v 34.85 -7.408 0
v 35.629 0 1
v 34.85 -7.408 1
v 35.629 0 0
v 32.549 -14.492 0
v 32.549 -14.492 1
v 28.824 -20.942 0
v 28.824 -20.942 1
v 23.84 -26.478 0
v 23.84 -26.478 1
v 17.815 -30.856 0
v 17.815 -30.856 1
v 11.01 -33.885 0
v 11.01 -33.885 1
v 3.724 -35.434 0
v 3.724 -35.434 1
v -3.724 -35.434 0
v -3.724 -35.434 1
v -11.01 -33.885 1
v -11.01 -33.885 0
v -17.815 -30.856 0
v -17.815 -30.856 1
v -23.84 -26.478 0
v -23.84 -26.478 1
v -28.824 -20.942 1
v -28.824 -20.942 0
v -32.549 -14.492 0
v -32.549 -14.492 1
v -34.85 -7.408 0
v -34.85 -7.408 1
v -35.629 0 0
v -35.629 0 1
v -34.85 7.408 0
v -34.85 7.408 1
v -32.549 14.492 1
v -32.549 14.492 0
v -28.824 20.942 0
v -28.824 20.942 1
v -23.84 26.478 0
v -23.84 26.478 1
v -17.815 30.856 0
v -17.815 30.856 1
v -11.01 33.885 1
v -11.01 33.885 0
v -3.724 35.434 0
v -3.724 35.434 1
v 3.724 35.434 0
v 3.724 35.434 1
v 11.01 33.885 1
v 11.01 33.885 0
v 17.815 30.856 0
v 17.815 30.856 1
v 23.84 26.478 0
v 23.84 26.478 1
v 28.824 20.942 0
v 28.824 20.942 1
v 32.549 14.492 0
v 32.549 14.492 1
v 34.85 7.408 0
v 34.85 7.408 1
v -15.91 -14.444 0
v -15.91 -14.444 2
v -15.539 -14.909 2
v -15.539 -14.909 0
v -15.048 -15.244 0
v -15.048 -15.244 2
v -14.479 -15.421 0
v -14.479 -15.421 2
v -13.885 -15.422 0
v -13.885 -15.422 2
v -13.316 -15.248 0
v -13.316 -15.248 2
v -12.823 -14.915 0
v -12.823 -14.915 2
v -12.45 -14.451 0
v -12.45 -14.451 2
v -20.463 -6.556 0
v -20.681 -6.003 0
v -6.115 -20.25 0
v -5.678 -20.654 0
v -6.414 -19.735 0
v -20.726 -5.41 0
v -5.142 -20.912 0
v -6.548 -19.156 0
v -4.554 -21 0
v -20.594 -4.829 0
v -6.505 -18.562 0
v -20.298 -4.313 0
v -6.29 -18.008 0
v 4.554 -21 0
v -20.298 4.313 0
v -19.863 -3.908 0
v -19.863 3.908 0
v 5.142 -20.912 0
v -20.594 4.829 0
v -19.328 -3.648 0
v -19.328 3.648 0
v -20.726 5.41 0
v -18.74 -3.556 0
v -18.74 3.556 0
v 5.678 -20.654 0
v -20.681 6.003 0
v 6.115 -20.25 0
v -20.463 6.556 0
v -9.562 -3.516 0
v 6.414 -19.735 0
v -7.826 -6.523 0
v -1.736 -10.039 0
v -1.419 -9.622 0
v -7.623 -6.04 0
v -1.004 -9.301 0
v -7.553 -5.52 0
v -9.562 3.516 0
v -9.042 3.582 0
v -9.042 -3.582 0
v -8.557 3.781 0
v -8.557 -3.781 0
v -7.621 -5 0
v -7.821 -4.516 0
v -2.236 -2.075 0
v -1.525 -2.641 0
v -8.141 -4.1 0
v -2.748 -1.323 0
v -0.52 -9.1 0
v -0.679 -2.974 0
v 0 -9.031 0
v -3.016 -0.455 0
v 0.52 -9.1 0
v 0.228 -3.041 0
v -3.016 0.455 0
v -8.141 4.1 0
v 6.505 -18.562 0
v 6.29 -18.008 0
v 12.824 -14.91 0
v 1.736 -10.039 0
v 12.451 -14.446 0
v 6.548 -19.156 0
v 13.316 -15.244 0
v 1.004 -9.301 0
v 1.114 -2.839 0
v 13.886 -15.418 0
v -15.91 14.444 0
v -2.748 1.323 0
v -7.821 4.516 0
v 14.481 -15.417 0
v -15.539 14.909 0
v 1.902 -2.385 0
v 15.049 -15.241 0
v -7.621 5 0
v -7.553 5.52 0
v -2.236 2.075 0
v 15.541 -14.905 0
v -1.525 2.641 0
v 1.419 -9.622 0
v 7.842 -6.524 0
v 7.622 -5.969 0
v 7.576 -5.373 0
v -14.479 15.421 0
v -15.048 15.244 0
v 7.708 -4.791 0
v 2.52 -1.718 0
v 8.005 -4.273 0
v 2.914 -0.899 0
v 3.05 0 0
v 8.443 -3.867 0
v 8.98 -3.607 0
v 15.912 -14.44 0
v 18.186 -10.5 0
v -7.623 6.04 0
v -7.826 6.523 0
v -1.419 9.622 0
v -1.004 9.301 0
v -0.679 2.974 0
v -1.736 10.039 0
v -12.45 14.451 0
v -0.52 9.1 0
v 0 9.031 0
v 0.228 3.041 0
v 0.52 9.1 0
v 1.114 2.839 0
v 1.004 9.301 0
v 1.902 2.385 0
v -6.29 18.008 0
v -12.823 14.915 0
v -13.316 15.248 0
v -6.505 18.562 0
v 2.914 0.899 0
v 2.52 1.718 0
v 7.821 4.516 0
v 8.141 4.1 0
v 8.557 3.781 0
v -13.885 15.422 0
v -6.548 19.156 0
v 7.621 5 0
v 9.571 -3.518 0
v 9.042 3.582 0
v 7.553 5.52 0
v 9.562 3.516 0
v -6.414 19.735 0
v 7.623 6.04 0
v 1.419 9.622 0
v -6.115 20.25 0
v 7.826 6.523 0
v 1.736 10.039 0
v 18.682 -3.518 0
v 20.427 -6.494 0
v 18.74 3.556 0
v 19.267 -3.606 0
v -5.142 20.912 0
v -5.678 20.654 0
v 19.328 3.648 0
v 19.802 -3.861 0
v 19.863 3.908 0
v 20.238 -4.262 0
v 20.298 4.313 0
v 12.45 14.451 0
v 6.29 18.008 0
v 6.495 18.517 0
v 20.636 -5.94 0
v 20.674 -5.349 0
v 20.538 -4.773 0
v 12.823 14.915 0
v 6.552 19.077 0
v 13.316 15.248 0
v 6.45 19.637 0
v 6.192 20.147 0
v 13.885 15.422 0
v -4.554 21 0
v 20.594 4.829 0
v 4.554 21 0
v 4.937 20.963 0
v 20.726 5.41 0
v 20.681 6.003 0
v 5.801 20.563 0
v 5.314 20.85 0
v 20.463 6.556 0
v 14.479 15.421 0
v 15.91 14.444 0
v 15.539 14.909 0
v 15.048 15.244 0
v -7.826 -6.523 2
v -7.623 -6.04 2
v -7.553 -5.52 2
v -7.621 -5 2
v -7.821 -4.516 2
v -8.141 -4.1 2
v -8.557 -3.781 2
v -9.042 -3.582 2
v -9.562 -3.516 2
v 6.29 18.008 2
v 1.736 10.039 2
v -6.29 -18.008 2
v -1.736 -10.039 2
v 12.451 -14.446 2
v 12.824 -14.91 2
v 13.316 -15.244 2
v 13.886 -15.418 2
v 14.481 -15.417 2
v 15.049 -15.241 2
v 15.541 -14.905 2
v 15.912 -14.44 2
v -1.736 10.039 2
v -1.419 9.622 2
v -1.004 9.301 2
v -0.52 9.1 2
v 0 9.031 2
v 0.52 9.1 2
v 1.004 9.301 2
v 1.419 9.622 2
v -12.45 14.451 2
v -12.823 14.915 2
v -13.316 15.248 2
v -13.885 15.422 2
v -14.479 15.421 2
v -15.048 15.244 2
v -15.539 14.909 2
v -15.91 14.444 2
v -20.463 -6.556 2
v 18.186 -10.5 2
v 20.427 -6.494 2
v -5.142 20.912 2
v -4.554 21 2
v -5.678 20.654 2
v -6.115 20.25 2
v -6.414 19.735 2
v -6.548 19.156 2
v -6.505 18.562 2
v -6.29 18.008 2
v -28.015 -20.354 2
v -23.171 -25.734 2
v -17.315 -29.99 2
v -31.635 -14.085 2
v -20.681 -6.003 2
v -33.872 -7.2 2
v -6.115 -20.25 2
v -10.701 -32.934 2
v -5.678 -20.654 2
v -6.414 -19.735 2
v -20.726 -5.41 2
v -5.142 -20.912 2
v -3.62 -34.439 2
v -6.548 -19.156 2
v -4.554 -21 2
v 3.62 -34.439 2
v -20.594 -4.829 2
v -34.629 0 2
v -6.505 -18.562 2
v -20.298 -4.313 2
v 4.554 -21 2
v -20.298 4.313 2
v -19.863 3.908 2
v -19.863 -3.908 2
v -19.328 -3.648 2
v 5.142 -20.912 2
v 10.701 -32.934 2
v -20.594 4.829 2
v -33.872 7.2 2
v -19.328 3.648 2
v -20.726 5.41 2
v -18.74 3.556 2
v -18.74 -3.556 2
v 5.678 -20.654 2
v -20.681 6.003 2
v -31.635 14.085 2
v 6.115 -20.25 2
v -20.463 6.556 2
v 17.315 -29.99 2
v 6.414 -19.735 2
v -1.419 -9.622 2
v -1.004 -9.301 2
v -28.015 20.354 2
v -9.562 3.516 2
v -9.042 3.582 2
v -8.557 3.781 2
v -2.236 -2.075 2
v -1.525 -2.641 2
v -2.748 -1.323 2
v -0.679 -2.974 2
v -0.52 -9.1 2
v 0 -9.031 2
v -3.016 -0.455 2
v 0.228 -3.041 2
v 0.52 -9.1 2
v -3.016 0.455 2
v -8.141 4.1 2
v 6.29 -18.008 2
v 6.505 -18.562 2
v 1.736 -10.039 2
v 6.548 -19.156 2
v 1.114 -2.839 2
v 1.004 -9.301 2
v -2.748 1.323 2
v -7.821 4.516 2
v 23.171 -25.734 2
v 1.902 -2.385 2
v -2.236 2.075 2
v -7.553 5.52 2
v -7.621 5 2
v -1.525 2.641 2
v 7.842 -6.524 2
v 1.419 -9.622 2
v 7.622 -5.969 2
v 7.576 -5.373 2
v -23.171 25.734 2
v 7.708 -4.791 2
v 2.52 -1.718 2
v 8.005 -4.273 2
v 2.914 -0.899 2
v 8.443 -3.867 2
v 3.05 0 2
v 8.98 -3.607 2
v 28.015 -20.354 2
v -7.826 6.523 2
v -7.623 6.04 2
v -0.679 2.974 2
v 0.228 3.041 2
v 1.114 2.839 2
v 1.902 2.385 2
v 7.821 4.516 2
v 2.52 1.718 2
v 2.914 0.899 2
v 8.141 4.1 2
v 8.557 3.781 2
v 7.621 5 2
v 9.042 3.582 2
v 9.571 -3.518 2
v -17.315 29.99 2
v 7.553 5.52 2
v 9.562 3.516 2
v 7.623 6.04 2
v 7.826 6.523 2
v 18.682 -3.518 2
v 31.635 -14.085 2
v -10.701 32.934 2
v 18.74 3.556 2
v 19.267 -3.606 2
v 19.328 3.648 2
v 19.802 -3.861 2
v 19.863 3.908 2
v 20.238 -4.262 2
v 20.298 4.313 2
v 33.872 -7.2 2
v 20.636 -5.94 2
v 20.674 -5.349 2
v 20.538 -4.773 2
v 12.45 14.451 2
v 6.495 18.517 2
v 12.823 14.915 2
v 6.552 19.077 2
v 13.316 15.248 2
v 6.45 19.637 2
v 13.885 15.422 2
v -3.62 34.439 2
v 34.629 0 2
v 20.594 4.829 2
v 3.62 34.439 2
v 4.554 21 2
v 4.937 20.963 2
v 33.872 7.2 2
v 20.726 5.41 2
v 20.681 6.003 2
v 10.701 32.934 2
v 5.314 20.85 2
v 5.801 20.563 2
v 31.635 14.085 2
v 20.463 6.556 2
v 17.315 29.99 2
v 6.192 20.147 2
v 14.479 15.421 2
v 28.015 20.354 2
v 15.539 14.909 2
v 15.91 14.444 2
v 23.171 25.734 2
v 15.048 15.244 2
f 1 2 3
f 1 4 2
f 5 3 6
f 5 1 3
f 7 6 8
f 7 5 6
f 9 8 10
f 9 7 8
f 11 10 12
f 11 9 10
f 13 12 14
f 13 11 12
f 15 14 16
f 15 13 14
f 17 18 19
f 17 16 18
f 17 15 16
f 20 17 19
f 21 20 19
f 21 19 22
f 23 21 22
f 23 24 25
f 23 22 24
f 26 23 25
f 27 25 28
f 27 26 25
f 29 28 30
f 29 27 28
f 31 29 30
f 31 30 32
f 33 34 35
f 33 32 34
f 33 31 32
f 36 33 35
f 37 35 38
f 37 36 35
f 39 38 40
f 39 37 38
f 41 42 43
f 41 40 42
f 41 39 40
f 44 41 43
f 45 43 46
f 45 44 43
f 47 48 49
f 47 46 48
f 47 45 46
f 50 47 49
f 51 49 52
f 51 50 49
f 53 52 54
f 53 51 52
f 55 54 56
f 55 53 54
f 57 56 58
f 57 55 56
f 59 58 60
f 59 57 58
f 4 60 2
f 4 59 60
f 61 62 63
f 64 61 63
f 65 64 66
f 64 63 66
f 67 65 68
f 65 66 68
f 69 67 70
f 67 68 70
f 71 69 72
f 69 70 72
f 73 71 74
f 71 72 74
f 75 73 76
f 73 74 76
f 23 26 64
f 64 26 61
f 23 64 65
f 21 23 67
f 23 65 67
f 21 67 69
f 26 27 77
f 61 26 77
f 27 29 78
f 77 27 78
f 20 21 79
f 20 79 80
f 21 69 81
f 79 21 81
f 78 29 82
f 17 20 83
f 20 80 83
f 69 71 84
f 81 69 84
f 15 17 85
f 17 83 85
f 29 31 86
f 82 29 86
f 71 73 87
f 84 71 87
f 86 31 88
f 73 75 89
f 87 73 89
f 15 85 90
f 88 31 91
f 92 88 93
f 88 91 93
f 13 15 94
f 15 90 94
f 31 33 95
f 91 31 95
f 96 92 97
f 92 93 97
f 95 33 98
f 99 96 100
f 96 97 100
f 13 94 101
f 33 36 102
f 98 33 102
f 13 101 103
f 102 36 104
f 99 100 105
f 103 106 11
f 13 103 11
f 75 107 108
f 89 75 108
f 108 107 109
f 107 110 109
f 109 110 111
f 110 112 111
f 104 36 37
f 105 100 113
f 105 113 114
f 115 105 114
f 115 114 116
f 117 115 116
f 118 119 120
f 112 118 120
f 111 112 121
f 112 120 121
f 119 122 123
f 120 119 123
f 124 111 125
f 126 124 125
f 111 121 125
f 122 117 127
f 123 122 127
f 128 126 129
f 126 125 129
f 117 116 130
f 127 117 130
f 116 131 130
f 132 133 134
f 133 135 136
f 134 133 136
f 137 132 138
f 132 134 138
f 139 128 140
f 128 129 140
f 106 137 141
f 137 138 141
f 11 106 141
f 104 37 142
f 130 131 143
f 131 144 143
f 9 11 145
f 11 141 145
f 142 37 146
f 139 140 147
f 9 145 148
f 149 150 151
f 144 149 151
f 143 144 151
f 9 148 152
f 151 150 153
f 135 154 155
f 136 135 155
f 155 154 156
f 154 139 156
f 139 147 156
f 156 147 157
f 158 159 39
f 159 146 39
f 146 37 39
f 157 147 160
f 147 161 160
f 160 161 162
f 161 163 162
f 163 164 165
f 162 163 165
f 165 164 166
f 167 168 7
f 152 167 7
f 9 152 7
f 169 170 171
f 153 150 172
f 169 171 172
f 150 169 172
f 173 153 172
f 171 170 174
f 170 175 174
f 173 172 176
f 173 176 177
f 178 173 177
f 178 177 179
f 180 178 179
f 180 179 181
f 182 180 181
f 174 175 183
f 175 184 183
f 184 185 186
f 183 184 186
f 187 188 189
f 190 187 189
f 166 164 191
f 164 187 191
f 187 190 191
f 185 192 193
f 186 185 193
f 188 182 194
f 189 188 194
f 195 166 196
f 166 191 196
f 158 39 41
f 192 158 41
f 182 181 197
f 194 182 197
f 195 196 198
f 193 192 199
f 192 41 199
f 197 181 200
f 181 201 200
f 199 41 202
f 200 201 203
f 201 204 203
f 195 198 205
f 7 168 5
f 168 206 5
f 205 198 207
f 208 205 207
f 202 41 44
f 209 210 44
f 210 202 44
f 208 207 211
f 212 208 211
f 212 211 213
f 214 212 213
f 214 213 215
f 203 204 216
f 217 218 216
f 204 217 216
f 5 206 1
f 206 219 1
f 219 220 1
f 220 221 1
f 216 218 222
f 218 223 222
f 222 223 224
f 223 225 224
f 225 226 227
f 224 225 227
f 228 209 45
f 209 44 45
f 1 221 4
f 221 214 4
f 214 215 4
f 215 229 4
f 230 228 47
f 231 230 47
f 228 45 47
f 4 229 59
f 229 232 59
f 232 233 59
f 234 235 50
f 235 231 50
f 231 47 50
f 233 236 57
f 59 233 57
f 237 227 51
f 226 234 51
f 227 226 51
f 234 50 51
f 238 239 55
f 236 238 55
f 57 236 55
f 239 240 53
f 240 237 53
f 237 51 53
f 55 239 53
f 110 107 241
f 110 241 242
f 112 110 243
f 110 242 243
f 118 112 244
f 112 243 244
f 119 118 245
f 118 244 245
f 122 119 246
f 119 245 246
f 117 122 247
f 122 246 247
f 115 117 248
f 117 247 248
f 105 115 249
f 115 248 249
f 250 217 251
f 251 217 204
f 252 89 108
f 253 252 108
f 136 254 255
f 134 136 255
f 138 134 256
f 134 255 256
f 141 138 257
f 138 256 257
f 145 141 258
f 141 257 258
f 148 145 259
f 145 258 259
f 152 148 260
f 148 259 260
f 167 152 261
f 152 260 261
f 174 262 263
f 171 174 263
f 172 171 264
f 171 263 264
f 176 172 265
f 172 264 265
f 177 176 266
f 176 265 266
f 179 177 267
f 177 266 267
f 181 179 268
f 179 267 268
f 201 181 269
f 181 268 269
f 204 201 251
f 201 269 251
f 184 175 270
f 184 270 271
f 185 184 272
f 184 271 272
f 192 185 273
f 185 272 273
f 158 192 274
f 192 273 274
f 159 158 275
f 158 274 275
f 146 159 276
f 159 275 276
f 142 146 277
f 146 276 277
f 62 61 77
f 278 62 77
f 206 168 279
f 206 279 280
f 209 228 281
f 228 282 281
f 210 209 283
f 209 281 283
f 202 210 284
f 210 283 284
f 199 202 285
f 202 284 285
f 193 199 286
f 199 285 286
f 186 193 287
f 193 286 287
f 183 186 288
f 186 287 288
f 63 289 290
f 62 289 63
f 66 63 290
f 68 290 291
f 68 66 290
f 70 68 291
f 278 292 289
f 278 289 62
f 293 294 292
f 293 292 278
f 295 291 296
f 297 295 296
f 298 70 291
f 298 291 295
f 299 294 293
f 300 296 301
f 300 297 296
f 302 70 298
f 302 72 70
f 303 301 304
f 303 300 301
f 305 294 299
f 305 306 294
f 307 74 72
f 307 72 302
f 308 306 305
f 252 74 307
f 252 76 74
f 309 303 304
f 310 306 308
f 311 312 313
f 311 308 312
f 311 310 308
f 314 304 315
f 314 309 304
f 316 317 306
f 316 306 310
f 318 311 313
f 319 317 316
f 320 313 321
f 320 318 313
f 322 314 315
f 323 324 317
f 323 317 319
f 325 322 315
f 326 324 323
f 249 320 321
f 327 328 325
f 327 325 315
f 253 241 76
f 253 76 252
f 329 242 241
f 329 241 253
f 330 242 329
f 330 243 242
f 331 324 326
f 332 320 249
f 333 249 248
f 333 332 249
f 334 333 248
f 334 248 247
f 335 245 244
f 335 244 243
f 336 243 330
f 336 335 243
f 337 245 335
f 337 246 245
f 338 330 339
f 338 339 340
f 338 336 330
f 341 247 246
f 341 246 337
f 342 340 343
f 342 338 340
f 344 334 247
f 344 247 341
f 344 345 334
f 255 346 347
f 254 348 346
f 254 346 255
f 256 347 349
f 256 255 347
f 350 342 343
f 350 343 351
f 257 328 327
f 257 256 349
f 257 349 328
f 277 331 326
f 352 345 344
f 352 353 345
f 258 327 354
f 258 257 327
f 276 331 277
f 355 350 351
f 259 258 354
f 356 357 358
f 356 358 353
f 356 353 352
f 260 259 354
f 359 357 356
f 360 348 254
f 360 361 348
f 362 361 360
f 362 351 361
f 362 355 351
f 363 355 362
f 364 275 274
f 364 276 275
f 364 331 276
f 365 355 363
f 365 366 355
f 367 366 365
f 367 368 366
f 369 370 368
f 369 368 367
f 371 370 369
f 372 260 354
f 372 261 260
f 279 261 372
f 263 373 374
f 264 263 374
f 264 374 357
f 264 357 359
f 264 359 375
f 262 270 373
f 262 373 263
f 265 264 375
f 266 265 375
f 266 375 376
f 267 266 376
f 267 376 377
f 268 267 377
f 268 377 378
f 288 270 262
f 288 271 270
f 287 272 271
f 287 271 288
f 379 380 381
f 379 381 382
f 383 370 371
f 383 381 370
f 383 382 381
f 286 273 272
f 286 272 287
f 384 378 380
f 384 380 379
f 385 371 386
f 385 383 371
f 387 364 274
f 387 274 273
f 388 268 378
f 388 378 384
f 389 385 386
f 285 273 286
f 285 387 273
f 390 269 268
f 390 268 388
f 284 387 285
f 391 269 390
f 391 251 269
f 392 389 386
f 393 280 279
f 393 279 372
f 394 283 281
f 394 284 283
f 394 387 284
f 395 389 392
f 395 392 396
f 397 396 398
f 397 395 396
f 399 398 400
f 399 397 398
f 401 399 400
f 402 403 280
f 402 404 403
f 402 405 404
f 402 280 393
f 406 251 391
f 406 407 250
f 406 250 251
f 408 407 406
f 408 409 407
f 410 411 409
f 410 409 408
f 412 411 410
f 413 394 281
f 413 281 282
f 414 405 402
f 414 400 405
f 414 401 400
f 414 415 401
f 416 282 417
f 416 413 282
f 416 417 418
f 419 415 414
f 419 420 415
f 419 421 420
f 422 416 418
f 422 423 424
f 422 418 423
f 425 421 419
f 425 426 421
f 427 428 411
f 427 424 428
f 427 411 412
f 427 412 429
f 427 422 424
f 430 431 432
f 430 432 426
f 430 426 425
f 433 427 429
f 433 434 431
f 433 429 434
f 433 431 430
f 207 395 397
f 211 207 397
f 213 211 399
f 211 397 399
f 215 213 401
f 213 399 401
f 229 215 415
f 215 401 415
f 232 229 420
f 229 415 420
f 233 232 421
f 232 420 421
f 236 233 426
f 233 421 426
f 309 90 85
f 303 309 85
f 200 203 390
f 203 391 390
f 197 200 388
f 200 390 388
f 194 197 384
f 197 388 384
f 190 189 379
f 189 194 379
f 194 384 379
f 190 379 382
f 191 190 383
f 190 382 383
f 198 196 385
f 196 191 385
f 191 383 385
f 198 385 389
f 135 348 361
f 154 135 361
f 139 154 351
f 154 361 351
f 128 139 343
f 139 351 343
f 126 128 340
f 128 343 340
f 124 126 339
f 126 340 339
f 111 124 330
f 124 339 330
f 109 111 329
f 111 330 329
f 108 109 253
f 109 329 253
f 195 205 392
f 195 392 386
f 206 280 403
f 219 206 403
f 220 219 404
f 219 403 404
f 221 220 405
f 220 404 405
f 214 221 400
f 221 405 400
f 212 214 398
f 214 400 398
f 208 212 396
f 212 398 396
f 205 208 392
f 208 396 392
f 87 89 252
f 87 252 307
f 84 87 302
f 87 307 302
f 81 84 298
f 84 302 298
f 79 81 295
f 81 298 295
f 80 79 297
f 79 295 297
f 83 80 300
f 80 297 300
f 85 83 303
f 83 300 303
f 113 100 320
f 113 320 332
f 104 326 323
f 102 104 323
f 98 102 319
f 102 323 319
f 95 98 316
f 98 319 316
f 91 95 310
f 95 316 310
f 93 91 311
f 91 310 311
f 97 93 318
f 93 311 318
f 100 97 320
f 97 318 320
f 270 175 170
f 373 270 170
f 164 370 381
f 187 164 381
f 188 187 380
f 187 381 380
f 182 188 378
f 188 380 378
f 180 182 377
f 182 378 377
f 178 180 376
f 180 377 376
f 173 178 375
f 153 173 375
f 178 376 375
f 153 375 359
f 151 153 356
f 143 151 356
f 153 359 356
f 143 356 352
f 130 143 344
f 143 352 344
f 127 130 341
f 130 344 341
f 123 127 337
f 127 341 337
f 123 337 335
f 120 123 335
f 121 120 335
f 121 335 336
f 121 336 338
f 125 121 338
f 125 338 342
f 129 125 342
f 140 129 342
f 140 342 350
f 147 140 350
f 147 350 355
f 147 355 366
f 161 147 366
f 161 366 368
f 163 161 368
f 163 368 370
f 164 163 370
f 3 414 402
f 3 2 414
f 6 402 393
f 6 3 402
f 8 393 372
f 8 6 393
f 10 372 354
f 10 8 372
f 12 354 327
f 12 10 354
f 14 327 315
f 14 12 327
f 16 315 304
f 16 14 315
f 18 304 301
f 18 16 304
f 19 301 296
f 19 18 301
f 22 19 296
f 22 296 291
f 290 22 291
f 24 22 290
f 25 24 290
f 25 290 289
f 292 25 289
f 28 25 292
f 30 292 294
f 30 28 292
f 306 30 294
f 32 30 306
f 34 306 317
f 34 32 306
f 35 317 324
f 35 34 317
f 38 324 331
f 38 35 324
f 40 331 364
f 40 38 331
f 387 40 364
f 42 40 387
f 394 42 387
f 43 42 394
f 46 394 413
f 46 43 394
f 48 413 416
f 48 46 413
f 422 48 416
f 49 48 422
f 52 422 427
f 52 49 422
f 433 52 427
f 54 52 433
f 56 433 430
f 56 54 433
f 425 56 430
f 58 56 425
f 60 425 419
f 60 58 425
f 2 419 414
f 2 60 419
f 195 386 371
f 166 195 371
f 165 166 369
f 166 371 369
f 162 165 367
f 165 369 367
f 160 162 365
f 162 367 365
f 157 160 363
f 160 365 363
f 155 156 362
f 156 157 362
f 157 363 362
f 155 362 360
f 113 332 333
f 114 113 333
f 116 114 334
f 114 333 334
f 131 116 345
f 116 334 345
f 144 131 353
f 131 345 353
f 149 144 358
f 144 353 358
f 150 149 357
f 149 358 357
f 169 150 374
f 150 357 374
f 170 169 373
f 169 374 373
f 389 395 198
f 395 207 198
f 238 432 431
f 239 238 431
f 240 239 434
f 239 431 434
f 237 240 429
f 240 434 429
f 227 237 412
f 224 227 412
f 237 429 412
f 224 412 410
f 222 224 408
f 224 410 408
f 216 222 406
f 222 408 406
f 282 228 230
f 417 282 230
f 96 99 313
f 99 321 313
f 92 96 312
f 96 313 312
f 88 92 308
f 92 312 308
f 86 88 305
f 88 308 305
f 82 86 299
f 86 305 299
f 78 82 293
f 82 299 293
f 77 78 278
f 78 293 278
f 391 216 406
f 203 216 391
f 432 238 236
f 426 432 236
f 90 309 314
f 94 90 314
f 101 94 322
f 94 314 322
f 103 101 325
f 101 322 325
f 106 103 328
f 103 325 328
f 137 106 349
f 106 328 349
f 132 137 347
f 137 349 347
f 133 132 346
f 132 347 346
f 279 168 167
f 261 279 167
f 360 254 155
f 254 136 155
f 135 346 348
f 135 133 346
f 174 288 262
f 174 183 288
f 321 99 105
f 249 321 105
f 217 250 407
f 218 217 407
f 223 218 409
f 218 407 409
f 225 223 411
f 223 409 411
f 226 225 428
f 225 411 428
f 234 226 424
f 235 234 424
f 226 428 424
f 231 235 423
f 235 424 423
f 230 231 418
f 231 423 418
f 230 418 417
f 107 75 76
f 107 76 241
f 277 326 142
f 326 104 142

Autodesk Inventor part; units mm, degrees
sketch "Sketch1" plane through (0, 0, 0) normal (0, 0, 1) x (1, 0, 0)
  line L0 (0, 2.8582) -> (0, -2.8582) construction
  line L1 (-5.7775, 0) -> (5.7775, 0) construction
  circle A0 centre (0, 0) radius 35.629
  circle A1 centre (0, 0) radius 4
  line L2 (0, 4) -> (0, 7)
  line L3 (0, 7) -> (0, 21)
  line L4 (0, 21) -> (5, 21)
  line L5 (5, 21) -> (8, 21)
  line L6 (8, 21) -> (0, 7)
  line L7 (0, 21) -> (-8, 21)
  line L8 (-8, 21) -> (0, 7)
  line L9 (0, -4) -> (0, -7)
  line L10 (0, -7) -> (0, -21)
  line L11 (0, -21) -> (8, -21)
  line L12 (8, -21) -> (0, -7)
  line L13 (0, -21) -> (-8, -21)
  line L14 (-8, -21) -> (0, -7)
  line L15 (0, 0) -> (2.5981, 1.5)
  line L16 (0, 0) -> (3, 0) construction
  line L17 (2.5981, 1.5) -> (3.4641, 2)
  line L18 (3.4641, 2) -> (6.0622, 3.5)
  line L19 (6.0622, 3.5) -> (18.1865, 10.5)
  line L20 (18.1865, 10.5) -> (14.1865, 17.4282)
  line L21 (14.1865, 17.4282) -> (6.0622, 3.5)
  line L22 (18.1865, 10.5) -> (22.1865, 3.5718)
  line L23 (22.1865, 3.5718) -> (6.0622, 3.5)
  line L24 (0, 0) -> (8, 0) construction
  line L25 (0, 0) -> (3.4641, -2)
  line L26 (0, 0) -> (4, 0) construction
  line L27 (3.4641, -2) -> (6.0622, -3.5)
  line L28 (6.0622, -3.5) -> (18.1865, -10.5)
  line L29 (18.1865, -10.5) -> (14.1865, -17.4282)
  line L30 (14.1865, -17.4282) -> (6.0934, -3.518)
  line L31 (18.1865, -10.5) -> (22.0919, -3.518)
  line L32 (22.0919, -3.518) -> (6.0934, -3.518)
  line L33 (0, 0) -> (-2.5981, 1.5)
  line L34 (0, 0) -> (3, 0) construction
  line L35 (-2.5981, 1.5) -> (-3.4641, 2)
  line L36 (-3.4641, 2) -> (-6.0622, 3.5)
  line L37 (-6.0622, 3.5) -> (-18.1865, 10.5)
  line L38 (-18.1865, 10.5) -> (-14.1865, 17.4282)
  line L39 (-14.1865, 17.4282) -> (-6.0622, 3.5)
  line L40 (-18.1865, 10.5) -> (-22.1865, 3.5718)
  line L41 (-22.1865, 3.5718) -> (-6.0622, 3.5)
  line L42 (0, 0) -> (-6.0622, -3.5)
  line L43 (0, 0) -> (7, 0) construction
  line L44 (-6.0622, -3.5) -> (-18.1865, -10.5)
  line L45 (-18.1865, -10.5) -> (-14.1865, -17.4282)
  line L46 (-14.1865, -17.4282) -> (-6.0622, -3.5)
  line L47 (-18.1865, -10.5) -> (-22.1865, -3.5718)
  line L48 (-22.1865, -3.5718) -> (-6.0622, -3.5)
  dimension "d0" = 71.258
  dimension "d1" = 8
  dimension "d2" = 3
  dimension "d3" = 14
  dimension "d4" = 5
  dimension "d5" = 3
  dimension "d6" = 8
  dimension "d7" = 3
  dimension "d8" = 14
  dimension "d9" = 8
  dimension "d10" = 8
  dimension "d11" = 3
  dimension "d12" = 30
  dimension "d13" = 3
  dimension "d14" = 14
  dimension "d15" = 8
  dimension "d16" = 8
  dimension "d19" = 4
  dimension "d20" = 30
  dimension "d21" = 3
  dimension "d22" = 14
  dimension "d23" = 8
  dimension "d24" = 8
  dimension "d25" = 3
  dimension "d26" = 150
  dimension "d27" = 1
  dimension "d28" = 180
  dimension "d29" = 3
  dimension "d30" = 180
  dimension "d31" = 180
  dimension "d32" = 8
  dimension "d33" = 8
  dimension "d34" = 7
  dimension "d35" = 150
  dimension "d36" = 14
  dimension "d37" = 180
  dimension "d38" = 8
  dimension "d39" = 8
extrude "Extrusion1" add sketch "Sketch1" along normal blind 2
fillet "Fillet1" radius 2 18 edges at (14.1865, 17.4282, 1) (22.1865, 3.5718, 1) (6.0622, 3.5, 1) (22.0919, -3.518, 1) (14.1865, -17.4282, 1) (6.0934, -3.518, 1) (0, 7, 1) (-8, 21, 1) (8, 21, 1) (-6.0622, 3.5, 1) (-22.1865, 3.5718, 1) (-14.1865, 17.4282, 1) (-6.0622, -3.5, 1) (-14.1865, -17.4282, 1) (-22.1865, -3.5718, 1) (-8, -21, 1) (0, -7, 1) (8, -21, 1)
sketch "Sketch2" plane through (0, 0, 2) normal (0, 0, 1) x (1, 0, 0)
  circle A0 centre (0, 0) radius 3.05
  circle A1 centre (0, 0) radius 5
  dimension "d43" = 6.1
  dimension "d49" = 10
extrude "Extrusion2" add sketch "Sketch2" against normal blind 2
chamfer "Chamfer1" distance 1 angle 45 1 edges at (-35.629, 0, 2)
properties part number "Wiel hout x 20mm" material "S235"
